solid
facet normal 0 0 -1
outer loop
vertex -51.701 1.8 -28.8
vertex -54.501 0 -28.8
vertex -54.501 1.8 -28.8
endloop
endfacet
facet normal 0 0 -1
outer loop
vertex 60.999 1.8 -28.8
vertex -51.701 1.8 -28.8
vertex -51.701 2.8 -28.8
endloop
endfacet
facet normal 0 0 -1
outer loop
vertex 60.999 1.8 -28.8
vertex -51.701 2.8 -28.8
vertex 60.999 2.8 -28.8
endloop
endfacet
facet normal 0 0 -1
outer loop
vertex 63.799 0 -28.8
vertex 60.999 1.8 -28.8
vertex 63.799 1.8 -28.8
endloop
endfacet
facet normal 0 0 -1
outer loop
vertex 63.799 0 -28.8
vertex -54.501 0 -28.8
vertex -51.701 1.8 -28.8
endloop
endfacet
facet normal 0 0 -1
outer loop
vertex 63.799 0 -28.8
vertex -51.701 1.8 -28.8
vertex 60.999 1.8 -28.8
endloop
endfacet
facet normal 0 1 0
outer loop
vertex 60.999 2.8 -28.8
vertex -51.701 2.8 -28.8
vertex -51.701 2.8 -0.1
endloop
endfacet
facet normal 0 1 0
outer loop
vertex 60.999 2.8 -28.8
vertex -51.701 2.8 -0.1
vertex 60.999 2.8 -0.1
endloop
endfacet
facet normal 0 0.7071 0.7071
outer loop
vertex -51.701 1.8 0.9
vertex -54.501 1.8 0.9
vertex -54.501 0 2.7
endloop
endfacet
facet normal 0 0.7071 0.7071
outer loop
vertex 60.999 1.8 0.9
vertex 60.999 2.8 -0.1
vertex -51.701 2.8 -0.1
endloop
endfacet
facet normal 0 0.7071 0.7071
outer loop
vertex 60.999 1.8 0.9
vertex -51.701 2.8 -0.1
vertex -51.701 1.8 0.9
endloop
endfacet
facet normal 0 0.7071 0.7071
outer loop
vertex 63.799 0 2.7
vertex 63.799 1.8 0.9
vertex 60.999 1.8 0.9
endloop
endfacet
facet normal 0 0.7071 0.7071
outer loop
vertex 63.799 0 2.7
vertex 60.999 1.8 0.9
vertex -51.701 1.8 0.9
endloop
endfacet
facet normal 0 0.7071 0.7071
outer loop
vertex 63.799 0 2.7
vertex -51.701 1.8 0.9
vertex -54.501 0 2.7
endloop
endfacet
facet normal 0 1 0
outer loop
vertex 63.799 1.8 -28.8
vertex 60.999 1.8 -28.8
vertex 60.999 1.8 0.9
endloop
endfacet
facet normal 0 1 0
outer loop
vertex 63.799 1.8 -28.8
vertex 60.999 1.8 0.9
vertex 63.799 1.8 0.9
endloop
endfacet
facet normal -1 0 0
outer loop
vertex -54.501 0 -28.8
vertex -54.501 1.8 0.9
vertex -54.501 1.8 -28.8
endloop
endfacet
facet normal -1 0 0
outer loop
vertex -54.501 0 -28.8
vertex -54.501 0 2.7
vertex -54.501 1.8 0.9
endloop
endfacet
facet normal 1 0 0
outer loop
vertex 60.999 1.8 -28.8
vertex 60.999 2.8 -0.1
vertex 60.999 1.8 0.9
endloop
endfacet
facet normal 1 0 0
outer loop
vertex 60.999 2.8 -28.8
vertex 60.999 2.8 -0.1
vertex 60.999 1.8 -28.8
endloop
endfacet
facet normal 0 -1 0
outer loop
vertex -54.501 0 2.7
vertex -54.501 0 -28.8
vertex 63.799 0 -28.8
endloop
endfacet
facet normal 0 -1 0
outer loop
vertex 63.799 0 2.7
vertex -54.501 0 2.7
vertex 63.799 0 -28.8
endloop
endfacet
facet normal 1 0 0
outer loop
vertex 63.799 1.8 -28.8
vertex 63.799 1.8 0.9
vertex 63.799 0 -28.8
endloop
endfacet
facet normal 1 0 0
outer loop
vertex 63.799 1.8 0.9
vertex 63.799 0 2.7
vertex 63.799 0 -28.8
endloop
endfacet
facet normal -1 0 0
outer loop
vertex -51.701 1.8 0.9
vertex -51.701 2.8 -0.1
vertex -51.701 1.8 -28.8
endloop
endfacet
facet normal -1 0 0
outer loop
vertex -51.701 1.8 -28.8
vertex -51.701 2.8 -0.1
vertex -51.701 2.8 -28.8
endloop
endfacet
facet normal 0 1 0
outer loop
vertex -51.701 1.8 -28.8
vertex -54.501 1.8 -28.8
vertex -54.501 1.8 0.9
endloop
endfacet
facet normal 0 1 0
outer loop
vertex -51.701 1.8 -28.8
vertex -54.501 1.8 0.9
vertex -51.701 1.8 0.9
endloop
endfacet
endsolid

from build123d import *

# Parameters (mm, degrees)
SKETCH_1_W          = 118.3
SKETCH_1_H          = 31.5
EXTRUDE_1_DEPTH     = 2.8
CUT_EXTRUDE_1_DEPTH = 122.787422537
SKETCH_3_W          = 2.8
SKETCH_3_H          = 31.5
CUT_EXTRUDE_2_DEPTH = 1


with BuildPart() as part:
    # 草图1 → 凸台-拉伸1 (new body)
    with BuildSketch(Plane(origin=(0, 0, 0), x_dir=(1, 0, 0), z_dir=(0, 1, 0))):
        with Locations((4.649344978, 13.05010917)):
            Rectangle(SKETCH_1_W, SKETCH_1_H)
    extrude(amount=EXTRUDE_1_DEPTH)

    # 草图2 → 切除-拉伸1 (cut, through all)
    with BuildSketch(Plane(origin=(63.799344978, 0, 0), x_dir=(0, 0, -1), z_dir=(1, 0, 0))):
        Polygon((-2.69989083, 0), (-2.69989083, 2.8), (0.10010917, 2.8), align=None)
    extrude(amount=-CUT_EXTRUDE_1_DEPTH, mode=Mode.SUBTRACT)

    # 草图3 → 切除-拉伸2 (cut)
    with BuildSketch(Plane(origin=(0, 2.8, 0), x_dir=(1, 0, 0), z_dir=(0, 1, 0))):
        with Locations((-53.100655022, 13.05010917)):
            Rectangle(SKETCH_3_W, SKETCH_3_H)
        with Locations((62.399344978, 13.05010917)):
            Rectangle(SKETCH_3_W, SKETCH_3_H)
    extrude(amount=-CUT_EXTRUDE_2_DEPTH, mode=Mode.SUBTRACT)


solid = part.part
